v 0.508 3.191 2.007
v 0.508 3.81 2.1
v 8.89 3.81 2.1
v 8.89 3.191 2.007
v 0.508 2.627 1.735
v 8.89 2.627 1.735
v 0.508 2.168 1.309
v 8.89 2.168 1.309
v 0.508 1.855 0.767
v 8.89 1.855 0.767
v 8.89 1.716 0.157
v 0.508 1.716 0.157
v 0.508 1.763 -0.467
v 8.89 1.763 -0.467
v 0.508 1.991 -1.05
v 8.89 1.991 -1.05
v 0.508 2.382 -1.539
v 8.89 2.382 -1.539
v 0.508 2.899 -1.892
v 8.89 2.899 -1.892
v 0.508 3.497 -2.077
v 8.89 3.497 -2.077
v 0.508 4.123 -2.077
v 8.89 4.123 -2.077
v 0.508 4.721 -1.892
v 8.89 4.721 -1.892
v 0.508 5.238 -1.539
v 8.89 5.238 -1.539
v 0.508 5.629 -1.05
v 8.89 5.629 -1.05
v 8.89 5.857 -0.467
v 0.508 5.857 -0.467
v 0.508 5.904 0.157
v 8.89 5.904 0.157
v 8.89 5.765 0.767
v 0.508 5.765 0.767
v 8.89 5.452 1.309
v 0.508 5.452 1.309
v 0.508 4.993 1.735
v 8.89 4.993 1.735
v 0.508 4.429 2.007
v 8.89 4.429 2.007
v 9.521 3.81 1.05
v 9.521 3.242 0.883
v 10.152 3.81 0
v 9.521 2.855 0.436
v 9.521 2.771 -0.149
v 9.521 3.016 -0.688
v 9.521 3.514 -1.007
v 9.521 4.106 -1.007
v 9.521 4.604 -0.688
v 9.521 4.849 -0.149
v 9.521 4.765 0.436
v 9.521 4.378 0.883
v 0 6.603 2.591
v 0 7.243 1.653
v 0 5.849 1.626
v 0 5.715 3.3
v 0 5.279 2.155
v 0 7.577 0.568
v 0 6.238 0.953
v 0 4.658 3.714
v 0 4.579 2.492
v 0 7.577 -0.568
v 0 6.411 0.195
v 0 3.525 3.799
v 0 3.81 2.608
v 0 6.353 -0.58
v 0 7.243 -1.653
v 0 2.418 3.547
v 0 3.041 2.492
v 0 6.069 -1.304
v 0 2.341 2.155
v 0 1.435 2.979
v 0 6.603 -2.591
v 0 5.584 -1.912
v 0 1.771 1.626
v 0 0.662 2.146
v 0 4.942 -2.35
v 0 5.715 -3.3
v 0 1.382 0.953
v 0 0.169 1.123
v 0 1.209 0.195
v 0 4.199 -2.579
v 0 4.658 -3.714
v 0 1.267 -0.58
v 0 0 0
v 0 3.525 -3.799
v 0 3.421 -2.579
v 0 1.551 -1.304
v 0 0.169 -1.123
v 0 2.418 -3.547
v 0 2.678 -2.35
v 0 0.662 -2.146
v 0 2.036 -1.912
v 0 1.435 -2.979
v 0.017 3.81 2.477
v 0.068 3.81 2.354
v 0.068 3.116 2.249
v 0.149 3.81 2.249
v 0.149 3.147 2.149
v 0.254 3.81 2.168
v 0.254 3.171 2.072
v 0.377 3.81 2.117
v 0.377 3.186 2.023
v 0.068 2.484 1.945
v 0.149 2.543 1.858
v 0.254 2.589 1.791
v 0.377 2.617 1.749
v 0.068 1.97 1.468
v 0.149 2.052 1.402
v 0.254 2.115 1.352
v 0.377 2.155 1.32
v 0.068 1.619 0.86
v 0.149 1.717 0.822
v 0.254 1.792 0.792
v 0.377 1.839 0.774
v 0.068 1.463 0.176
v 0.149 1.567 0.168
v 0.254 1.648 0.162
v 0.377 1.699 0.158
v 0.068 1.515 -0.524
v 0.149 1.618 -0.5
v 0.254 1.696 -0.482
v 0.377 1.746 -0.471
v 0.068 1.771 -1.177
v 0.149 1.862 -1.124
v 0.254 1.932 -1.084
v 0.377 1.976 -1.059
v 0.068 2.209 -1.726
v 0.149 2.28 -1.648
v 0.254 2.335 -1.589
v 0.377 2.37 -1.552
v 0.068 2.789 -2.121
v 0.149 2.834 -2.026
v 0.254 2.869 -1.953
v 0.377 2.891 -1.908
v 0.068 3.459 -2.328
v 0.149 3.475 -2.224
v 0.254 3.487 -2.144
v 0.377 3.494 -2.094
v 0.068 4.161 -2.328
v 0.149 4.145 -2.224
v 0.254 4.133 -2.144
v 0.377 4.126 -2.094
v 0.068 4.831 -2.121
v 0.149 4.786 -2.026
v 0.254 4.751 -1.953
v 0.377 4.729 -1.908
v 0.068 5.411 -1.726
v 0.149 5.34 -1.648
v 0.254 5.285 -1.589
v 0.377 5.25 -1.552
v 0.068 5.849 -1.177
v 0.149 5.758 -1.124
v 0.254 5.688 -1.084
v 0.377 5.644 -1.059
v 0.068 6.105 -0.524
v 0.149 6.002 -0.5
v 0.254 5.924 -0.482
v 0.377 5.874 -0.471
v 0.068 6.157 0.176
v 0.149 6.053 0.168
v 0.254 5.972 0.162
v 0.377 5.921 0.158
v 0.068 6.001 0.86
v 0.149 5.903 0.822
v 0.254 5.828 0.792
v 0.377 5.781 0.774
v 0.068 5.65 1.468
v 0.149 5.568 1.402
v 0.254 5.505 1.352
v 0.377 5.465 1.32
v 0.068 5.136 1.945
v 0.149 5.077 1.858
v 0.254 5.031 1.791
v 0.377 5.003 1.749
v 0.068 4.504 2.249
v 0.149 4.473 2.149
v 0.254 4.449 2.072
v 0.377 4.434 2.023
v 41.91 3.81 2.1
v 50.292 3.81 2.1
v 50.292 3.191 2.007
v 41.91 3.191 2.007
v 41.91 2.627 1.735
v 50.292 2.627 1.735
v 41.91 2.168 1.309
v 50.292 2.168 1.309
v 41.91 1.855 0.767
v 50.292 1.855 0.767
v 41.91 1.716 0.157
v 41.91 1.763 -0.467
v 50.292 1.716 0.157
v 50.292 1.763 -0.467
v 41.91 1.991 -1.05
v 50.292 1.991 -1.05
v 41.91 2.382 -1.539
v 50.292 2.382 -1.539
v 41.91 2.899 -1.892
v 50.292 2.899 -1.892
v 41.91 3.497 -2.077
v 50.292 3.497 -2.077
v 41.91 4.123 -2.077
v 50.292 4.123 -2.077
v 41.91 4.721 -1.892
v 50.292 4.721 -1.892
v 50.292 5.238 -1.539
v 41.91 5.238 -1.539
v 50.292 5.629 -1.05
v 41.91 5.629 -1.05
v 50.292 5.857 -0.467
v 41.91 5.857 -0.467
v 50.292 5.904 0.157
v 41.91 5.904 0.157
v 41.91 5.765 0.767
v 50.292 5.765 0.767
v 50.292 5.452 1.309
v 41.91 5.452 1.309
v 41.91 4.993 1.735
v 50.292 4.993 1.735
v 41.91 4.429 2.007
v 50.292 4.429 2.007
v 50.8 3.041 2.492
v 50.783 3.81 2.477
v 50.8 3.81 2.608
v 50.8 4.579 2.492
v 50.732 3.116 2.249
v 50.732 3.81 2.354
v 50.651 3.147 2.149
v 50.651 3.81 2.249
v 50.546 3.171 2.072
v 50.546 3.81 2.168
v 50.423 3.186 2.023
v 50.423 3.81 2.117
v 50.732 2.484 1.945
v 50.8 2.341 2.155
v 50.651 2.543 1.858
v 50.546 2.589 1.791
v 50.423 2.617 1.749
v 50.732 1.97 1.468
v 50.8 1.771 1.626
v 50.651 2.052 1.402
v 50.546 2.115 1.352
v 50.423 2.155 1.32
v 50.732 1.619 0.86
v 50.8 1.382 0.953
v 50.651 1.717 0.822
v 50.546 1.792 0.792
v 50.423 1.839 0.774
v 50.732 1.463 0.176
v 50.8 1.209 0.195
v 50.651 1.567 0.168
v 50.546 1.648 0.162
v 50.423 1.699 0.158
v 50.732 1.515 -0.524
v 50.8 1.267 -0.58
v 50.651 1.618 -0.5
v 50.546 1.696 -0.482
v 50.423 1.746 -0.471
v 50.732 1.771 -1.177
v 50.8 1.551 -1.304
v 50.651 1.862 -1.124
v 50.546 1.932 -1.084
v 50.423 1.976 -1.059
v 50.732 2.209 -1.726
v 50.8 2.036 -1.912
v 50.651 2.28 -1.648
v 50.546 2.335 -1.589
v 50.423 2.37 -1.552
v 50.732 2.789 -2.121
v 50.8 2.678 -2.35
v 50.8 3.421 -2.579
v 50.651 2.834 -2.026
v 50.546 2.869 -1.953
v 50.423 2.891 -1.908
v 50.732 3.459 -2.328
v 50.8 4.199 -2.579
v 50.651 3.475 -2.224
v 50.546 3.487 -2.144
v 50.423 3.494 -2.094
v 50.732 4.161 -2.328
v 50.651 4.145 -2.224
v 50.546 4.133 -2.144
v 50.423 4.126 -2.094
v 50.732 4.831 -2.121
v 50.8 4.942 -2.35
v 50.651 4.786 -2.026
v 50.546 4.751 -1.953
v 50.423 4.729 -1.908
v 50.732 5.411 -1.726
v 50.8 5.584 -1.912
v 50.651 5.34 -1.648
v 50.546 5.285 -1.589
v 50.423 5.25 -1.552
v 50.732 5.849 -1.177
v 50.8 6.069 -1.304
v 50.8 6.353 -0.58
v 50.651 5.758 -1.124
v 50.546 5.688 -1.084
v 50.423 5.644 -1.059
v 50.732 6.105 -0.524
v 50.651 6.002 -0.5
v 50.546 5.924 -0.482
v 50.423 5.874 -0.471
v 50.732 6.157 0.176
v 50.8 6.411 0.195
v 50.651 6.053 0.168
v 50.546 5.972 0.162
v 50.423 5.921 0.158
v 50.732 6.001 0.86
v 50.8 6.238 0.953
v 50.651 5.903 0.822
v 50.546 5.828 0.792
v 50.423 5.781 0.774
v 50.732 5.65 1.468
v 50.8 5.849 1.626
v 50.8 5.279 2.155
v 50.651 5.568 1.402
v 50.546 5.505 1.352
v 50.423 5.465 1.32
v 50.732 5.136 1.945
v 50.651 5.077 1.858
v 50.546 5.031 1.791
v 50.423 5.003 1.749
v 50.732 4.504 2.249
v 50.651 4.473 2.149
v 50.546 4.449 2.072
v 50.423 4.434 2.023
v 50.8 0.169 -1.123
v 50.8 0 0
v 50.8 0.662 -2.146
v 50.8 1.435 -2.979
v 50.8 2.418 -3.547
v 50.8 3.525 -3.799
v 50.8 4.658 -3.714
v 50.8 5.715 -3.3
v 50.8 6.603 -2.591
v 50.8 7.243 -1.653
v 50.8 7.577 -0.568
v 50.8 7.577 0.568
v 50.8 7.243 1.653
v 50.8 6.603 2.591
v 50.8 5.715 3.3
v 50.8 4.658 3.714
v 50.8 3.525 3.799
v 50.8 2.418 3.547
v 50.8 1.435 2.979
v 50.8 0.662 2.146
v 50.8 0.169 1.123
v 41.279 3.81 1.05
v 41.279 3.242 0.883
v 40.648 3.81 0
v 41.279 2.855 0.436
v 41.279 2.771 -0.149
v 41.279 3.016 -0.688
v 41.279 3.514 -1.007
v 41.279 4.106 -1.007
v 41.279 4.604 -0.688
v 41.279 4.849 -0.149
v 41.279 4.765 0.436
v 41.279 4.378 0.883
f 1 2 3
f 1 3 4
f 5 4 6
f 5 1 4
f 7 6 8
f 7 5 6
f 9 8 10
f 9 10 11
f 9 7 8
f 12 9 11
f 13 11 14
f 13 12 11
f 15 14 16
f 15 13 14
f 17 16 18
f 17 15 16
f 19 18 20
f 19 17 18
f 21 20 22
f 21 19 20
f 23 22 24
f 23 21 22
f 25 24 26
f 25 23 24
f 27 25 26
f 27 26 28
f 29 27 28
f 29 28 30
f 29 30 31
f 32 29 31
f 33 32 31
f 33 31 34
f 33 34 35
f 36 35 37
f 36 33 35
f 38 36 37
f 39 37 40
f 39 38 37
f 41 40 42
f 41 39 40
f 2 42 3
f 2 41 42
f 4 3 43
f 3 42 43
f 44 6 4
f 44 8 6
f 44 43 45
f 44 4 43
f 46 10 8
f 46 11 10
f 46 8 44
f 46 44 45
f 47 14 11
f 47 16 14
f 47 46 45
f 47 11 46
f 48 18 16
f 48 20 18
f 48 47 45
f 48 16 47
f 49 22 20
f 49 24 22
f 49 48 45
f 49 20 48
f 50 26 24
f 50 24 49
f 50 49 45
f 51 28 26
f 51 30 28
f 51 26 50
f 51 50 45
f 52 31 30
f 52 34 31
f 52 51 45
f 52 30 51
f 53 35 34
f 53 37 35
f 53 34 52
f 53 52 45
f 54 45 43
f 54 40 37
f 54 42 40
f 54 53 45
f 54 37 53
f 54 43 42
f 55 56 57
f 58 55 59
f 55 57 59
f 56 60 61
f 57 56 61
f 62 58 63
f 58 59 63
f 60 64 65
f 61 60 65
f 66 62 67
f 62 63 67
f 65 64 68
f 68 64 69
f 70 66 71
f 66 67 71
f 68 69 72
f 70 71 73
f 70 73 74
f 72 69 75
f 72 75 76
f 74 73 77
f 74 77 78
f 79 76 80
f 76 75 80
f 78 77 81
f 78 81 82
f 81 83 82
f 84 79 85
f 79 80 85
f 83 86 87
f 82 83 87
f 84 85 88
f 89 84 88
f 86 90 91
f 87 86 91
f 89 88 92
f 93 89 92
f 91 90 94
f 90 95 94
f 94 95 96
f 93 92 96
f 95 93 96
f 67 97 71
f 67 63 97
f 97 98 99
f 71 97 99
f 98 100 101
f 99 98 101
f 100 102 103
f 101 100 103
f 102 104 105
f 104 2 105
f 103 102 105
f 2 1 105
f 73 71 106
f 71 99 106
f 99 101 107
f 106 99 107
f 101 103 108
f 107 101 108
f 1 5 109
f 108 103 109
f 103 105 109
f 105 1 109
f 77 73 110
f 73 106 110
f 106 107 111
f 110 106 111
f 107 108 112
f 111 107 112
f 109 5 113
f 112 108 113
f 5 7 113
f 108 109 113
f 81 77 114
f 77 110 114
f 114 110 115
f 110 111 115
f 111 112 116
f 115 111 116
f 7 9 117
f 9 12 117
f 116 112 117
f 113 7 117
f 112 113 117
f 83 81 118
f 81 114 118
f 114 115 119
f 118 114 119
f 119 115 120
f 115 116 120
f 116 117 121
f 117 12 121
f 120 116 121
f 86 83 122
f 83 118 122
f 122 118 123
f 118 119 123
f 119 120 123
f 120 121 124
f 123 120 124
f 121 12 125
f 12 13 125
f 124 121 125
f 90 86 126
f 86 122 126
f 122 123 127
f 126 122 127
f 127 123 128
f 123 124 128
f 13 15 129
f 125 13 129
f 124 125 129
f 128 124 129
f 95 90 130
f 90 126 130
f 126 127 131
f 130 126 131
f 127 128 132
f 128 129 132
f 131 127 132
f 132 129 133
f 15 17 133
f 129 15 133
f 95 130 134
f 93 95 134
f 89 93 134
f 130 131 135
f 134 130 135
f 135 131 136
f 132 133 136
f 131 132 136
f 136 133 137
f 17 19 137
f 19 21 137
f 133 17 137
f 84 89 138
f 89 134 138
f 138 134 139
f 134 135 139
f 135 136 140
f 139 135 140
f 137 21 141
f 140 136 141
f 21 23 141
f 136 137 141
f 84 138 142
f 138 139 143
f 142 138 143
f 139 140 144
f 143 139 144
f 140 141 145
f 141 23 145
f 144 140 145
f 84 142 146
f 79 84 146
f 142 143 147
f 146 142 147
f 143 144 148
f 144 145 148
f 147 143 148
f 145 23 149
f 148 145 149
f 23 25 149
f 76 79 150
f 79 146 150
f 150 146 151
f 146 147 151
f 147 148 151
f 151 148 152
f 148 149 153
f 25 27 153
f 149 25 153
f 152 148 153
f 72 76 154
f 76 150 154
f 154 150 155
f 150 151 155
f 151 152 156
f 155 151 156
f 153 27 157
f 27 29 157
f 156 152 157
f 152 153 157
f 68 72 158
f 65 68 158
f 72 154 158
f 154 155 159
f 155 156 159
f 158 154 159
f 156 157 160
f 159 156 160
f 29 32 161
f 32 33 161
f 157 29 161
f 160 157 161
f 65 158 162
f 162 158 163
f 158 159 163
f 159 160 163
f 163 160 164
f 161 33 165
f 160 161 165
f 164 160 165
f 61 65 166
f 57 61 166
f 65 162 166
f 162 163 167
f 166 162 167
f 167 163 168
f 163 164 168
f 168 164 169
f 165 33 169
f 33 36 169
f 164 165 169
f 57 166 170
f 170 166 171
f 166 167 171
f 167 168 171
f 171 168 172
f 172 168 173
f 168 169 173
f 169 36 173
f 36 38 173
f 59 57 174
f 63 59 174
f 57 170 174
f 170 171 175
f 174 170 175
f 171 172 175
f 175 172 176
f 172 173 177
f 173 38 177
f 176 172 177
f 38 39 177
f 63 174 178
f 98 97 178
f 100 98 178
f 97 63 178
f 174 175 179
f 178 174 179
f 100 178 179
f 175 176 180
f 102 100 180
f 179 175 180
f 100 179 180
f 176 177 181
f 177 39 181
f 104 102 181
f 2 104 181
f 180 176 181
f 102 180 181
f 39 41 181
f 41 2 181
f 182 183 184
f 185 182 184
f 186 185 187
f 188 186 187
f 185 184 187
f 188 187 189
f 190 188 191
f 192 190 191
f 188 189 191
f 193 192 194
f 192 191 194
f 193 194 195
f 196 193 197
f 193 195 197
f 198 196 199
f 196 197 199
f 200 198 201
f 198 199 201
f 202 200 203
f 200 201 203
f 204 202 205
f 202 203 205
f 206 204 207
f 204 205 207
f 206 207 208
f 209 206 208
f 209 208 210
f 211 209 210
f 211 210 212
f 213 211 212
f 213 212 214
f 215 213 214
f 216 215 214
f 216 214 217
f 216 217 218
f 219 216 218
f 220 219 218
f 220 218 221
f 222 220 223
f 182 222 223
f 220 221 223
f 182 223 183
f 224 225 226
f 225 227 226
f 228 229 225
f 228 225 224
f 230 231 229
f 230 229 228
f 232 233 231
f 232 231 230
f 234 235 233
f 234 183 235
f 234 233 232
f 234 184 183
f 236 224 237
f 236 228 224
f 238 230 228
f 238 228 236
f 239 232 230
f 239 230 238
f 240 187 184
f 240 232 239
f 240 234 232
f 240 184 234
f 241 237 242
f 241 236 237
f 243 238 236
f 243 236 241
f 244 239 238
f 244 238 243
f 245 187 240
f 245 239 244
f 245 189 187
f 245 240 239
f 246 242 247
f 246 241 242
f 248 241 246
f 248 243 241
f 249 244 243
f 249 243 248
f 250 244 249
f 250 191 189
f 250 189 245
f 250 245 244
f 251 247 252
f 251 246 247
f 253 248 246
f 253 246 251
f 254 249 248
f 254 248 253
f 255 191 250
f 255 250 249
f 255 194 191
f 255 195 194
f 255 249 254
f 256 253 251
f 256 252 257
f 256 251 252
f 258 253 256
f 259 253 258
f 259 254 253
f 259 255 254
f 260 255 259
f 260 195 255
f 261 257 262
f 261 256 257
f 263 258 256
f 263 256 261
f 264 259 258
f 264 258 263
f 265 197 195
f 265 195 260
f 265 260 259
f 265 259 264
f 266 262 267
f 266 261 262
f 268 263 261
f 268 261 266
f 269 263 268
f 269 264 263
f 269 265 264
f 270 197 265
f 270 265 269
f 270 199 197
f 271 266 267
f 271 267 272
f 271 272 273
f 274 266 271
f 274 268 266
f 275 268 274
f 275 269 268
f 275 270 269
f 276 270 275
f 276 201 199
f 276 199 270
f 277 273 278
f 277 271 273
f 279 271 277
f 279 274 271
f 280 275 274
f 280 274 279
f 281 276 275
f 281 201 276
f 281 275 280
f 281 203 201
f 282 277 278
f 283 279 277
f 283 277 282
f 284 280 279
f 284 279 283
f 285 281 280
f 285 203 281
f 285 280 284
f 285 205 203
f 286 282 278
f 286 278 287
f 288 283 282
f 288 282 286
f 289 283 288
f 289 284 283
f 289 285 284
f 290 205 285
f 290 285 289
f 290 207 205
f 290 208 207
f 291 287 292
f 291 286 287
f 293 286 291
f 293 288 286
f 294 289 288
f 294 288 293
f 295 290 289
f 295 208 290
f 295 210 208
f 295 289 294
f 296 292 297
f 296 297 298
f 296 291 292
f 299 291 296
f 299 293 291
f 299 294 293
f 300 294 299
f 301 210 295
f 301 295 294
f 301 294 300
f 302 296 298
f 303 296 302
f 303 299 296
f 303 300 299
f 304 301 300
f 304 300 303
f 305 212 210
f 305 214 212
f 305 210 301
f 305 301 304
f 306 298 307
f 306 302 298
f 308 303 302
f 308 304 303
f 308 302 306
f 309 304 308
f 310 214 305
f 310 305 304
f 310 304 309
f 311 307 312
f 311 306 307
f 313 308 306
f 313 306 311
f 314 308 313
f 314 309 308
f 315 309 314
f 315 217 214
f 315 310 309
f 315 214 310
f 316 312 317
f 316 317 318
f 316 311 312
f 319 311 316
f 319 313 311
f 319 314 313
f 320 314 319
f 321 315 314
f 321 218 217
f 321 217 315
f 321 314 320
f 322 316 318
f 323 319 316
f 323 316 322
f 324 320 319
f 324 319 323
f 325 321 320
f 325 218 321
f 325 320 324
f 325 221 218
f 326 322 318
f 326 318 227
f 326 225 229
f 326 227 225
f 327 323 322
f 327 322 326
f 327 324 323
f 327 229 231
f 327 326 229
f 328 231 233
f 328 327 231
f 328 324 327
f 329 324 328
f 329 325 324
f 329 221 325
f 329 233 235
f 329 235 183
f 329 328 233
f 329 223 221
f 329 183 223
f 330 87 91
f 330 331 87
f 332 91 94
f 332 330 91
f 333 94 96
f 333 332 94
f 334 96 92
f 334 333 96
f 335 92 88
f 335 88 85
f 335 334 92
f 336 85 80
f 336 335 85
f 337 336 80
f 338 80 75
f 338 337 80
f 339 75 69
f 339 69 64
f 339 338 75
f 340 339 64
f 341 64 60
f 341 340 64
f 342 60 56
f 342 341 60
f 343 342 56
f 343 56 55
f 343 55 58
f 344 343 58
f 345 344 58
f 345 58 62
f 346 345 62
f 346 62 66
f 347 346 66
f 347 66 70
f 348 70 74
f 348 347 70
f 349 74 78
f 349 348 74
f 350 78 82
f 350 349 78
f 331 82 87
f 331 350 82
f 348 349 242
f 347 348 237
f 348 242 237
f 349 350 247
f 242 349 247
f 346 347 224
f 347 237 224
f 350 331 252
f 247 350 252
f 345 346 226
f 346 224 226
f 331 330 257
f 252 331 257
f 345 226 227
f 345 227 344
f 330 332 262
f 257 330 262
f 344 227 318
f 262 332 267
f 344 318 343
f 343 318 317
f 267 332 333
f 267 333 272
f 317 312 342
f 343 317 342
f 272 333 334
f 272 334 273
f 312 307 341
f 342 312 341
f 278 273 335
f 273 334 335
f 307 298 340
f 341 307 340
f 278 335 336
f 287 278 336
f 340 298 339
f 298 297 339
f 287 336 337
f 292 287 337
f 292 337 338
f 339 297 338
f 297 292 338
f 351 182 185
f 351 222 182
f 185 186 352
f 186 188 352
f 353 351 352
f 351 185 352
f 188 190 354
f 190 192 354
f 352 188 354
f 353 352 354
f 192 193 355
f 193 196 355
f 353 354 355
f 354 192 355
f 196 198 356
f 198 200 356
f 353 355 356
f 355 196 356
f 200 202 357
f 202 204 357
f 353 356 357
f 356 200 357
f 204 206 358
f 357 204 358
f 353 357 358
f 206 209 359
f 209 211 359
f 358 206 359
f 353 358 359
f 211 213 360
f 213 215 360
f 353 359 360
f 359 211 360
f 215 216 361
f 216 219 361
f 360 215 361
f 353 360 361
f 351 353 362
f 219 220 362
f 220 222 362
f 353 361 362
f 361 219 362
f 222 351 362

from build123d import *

# Parameters (mm, degrees)
FILLET1_R = 0.508


with BuildPart() as part:
    # Sketch1 → Revolve1 (revolve)
    with BuildSketch(Plane.XY):
        Polygon((0, 0), (0, 3.81), (50.8, 3.81), (50.8, 0), (37.892541774, 0), (12.907458226, 0), align=None)
    revolve(axis=Axis((0, 3.81, 0), (1, 0, 0)))

    # Sketch6 → Tap Drill for M4 Helicoil1 (revolve, cut)
    with BuildSketch(Plane.ZX.offset(3.81)):
        Polygon((0, 0), (0, 10.1518073), (2.1, 8.89), (2.1, 0), align=None)
    tap_drill_for_m4_helicoil1 = revolve(axis=Axis((-6.35, 3.81, 0), (1, 0, 0)), mode=Mode.SUBTRACT)

    # Mirror1: Tap Drill for M4 Helicoil1 across plane
    add(tap_drill_for_m4_helicoil1.mirror(Plane.ZY.offset(-25.4)), mode=Mode.SUBTRACT)

    # Fillet1
    fillet1_edges = [part.edges().sort_by_distance(p)[0] for p in [
        (0, 3.81, -2.1),
        (50.8, 3.81, -2.1),
    ]]
    fillet(fillet1_edges, radius=FILLET1_R)


solid = part.part
